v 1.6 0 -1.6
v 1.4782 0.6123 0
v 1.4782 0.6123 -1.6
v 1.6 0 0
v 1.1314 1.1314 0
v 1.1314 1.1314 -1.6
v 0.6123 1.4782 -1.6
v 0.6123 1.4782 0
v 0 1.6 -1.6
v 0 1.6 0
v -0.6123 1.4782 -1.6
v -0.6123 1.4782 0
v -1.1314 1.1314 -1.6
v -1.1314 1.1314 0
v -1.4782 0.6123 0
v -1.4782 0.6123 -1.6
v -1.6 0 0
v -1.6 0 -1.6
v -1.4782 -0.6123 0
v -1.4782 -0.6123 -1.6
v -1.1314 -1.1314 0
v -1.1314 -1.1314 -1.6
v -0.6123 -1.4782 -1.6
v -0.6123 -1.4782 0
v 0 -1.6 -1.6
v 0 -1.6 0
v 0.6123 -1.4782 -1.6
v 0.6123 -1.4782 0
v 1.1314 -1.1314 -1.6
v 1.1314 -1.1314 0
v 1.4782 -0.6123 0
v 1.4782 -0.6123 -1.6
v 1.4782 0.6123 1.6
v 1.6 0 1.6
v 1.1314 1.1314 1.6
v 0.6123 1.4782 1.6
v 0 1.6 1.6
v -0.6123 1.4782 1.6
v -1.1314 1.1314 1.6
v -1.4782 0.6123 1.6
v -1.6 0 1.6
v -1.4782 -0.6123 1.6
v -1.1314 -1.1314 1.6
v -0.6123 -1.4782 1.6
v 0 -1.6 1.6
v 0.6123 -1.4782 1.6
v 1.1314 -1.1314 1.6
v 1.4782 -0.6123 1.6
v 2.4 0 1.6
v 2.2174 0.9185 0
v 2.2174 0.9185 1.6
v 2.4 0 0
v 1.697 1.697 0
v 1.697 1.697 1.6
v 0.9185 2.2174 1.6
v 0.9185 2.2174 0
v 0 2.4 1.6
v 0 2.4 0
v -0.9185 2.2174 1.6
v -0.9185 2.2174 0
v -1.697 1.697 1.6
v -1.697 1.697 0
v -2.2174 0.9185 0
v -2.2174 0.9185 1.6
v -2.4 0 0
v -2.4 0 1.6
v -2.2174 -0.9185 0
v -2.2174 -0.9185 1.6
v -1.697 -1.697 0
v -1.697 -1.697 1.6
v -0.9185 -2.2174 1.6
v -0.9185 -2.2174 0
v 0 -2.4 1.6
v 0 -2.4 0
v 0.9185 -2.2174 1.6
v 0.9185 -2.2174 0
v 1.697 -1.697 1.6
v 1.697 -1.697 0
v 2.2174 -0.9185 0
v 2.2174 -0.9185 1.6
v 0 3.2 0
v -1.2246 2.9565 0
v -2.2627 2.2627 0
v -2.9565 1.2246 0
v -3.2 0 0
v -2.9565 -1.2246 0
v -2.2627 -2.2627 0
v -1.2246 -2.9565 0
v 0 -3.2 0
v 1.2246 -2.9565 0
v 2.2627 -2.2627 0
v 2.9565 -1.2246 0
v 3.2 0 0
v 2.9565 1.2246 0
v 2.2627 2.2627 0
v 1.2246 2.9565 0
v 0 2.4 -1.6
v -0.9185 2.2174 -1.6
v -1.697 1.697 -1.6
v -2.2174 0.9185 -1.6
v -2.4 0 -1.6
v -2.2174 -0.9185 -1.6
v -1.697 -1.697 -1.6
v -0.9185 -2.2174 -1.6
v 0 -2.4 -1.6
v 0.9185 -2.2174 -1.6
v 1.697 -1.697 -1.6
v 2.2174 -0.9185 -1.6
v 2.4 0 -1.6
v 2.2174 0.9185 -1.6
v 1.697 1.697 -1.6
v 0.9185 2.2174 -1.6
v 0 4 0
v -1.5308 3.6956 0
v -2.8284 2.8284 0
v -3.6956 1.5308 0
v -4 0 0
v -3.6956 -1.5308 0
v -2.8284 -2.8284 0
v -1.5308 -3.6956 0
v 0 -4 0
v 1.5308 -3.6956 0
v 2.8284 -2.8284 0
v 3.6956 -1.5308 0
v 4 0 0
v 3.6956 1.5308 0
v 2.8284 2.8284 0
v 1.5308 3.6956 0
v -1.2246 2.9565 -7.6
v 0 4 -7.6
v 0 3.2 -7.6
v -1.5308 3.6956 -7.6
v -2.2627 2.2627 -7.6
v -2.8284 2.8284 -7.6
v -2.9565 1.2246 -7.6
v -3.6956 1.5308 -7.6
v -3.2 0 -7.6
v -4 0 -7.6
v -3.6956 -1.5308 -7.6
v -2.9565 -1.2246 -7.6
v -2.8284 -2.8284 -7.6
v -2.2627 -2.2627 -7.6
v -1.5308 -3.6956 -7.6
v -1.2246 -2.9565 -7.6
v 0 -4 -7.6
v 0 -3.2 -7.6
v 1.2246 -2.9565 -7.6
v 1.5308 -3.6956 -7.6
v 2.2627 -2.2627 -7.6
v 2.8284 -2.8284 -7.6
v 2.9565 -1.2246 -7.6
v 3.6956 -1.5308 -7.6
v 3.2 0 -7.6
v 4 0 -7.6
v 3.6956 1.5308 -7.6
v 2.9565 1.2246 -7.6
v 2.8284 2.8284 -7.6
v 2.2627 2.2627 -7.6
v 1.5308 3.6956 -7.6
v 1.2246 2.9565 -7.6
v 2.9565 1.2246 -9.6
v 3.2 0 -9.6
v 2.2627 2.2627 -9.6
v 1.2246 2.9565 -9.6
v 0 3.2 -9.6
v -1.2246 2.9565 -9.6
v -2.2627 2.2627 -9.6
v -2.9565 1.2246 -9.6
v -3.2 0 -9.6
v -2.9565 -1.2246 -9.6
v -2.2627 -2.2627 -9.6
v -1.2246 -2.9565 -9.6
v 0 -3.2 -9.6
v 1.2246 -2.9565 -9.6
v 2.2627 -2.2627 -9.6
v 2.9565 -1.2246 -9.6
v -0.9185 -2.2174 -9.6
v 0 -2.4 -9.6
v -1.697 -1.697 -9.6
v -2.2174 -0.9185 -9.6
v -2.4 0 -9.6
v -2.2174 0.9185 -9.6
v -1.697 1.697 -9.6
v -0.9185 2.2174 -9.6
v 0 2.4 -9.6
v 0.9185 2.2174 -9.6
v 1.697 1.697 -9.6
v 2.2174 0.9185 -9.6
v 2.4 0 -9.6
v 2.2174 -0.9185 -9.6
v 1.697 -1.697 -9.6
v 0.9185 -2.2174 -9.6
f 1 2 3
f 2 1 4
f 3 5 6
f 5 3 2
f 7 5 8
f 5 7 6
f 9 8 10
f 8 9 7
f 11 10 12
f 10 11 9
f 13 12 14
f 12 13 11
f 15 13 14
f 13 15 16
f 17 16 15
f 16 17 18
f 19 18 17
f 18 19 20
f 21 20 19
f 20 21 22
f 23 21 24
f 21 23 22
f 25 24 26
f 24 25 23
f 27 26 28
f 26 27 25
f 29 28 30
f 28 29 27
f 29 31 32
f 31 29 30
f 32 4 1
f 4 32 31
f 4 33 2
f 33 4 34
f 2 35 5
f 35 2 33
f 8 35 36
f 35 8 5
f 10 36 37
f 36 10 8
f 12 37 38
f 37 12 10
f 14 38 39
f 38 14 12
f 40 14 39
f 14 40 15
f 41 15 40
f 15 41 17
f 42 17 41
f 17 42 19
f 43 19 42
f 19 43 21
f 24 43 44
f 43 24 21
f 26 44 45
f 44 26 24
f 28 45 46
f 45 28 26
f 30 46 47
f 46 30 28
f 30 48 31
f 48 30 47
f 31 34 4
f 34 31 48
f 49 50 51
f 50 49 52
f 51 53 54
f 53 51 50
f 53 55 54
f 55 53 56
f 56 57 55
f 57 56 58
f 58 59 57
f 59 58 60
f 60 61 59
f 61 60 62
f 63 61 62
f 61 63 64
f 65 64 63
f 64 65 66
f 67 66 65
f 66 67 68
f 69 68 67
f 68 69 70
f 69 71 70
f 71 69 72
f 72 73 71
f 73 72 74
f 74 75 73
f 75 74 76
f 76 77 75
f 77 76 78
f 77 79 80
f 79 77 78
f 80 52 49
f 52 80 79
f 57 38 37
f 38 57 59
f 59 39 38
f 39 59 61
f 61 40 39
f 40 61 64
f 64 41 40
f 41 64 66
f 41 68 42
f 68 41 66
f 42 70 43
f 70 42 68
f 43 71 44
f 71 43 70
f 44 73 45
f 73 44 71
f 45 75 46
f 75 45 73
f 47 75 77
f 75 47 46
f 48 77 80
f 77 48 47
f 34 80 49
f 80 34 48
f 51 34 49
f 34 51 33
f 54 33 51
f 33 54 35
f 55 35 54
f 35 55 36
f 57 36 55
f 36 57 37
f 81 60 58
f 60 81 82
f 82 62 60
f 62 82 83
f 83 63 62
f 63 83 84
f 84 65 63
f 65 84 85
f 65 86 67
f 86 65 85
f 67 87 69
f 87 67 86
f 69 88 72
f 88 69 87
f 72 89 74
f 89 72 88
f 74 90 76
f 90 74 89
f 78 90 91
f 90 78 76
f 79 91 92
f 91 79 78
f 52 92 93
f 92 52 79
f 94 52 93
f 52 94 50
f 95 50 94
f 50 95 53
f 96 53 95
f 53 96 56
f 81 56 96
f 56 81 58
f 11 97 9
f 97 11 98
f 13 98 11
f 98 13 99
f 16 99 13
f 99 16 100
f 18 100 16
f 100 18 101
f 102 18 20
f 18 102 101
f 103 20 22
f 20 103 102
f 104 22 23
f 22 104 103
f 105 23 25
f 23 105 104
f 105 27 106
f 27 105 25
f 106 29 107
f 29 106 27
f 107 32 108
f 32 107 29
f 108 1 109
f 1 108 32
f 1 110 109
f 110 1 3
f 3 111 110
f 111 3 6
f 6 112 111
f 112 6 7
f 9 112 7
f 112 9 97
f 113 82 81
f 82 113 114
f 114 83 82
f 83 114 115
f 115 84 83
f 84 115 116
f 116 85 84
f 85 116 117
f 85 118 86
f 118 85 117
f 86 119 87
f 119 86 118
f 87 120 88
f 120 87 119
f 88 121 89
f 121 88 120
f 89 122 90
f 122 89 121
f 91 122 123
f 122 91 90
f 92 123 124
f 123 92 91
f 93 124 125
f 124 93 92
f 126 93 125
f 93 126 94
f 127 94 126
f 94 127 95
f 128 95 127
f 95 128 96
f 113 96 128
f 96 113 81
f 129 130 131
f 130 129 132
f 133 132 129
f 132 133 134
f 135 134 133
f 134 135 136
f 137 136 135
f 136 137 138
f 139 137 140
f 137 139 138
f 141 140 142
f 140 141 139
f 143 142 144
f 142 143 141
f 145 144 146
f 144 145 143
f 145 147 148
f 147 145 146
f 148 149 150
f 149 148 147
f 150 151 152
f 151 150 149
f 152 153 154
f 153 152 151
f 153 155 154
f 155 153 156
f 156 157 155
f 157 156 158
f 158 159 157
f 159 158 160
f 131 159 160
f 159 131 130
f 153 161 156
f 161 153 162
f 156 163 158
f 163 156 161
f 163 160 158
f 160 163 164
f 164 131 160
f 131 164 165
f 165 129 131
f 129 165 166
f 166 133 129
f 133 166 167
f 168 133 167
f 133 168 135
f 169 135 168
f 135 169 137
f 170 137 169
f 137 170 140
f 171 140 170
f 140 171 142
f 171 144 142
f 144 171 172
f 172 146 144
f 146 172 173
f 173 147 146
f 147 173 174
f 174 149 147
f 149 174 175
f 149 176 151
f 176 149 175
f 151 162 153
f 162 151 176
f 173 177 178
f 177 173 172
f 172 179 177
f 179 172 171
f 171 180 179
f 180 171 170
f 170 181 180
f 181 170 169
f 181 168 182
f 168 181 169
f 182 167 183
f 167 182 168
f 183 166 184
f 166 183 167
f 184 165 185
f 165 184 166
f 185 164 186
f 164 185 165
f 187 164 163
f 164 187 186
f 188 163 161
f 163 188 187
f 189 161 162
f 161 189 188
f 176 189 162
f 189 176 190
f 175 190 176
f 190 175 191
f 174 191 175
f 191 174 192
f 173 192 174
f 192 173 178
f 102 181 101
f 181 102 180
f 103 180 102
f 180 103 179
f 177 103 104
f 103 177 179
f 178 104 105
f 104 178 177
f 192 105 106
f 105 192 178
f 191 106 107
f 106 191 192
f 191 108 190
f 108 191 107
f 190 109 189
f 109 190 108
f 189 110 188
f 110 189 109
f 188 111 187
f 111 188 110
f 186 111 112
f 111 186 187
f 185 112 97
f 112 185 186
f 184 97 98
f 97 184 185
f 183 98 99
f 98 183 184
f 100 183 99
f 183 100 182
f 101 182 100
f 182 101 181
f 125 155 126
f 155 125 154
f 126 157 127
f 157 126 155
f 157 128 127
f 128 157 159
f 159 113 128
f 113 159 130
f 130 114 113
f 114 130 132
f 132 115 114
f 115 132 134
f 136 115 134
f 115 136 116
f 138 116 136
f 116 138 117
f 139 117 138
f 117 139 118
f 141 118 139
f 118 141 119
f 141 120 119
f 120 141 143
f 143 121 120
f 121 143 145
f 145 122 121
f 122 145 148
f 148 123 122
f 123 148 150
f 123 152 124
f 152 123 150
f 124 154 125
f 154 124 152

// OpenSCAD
// file: ../p/stud4od.scad
use <../lib.scad>
use <4-4cylo.scad>
use <4-4ring3.scad>
function ldraw_lib__stud4od() = [
// 0 Stud Tube Open without Outer Cylinder and Top Surface
// 0 Name: stud4od.dat
// 0 Author: Philippe Hurbain [Philo]
// 0 !LDRAW_ORG Primitive UPDATE 2013-02
// 0 !LICENSE Licensed under CC BY 2.0 and CC BY 4.0 : see CAreadme.txt
// 
// 0 !HELP This stud is a "antistud" to be used like a underside stud,
// 0 !HELP but without the outer cylinder.
// 0 !HELP 1 47 0 0 0 1 0 0 0 1 0 0 0 1 stud4.dat
// 
// 0 BFC CERTIFY CCW
  [0,"BFC","CERTIFY"],
  [0,"BFC","CCW"],
// 
// 0 !HISTORY 2013-12-23 [PTadmin] Official Update 2013-02
// 
// 
// 1 16 0 -4 0 2 0 0 0 1 0 0 0 2 4-4ring3.dat
  [1,16,0,-4,0,2,0,0,0,1,0,0,0,2, ldraw_lib__4_4ring3()],
// 0 BFC INVERTNEXT
  [0,"BFC","INVERTNEXT"],
// 1 16 0 0 0 -6 0 0 0 -4 0 0 0 6 4-4cylo.dat
  [1,16,0,0,0,-6,0,0,0,-4,0,0,0,6, ldraw_lib__4_4cylo()],
];
makepoly(ldraw_lib__stud4od(), line=0.2);
// file: ../p/stud2a.scad
use <../lib.scad>
use <4-4cyli.scad>
use <4-4edge.scad>
use <4-4ring2.scad>
function ldraw_lib__stud2a() = [
// 0 Stud Open without Base Edges
// 0 Name: stud2a.dat
// 0 Author: James Jessiman
// 0 !LDRAW_ORG Primitive UPDATE 2009-02
// 0 !LICENSE Licensed under CC BY 2.0 and CC BY 4.0 : see CAreadme.txt
// 
// 0 BFC CERTIFY CCW
  [0,"BFC","CERTIFY"],
  [0,"BFC","CCW"],
// 
// 0 !HISTORY 1999-07-05 [PTadmin] Official Update 1999-05
// 0 !HISTORY 2002-04-04 [sbliss] Modified for BFC compliance
// 0 !HISTORY 2002-04-25 [PTadmin] Official Update 2002-02
// 0 !HISTORY 2007-06-24 [PTadmin] Header formatted for Contributor Agreement
// 0 !HISTORY 2008-07-01 [PTadmin] Official Update 2008-01
// 0 !HISTORY 2009-06-21 [cwdee] Update ring references to 4-4ring
// 0 !HISTORY 2009-09-03 [PTadmin] Official Update 2009-02
// 
// 
// 1 16 0 -4 0 4 0 0 0 1 0 0 0 4 4-4edge.dat
  [1,16,0,-4,0,4,0,0,0,1,0,0,0,4, ldraw_lib__4_4edge()],
// 1 16 0 -4 0 6 0 0 0 1 0 0 0 6 4-4edge.dat
  [1,16,0,-4,0,6,0,0,0,1,0,0,0,6, ldraw_lib__4_4edge()],
// 0 BFC INVERTNEXT
  [0,"BFC","INVERTNEXT"],
// 1 16 0 -4 0 4 0 0 0 4 0 0 0 4 4-4cyli.dat
  [1,16,0,-4,0,4,0,0,0,4,0,0,0,4, ldraw_lib__4_4cyli()],
// 1 16 0 -4 0 6 0 0 0 4 0 0 0 6 4-4cyli.dat
  [1,16,0,-4,0,6,0,0,0,4,0,0,0,6, ldraw_lib__4_4cyli()],
// 1 16 0 -4 0 2 0 0 0 1 0 0 0 2 4-4ring2.dat
  [1,16,0,-4,0,2,0,0,0,1,0,0,0,2, ldraw_lib__4_4ring2()],
// 0
];
makepoly(ldraw_lib__stud2a(), line=0.2);
// file: ../p/4-4ring4.scad
use <../lib.scad>
function ldraw_lib__4_4ring4() = [
// 0 Ring  4 x 1.0
// 0 Name: 4-4ring4.dat
// 0 Author: James Jessiman
// 0 !LDRAW_ORG Primitive UPDATE 2009-01
// 0 !LICENSE Licensed under CC BY 2.0 and CC BY 4.0 : see CAreadme.txt
// 
// 0 BFC CERTIFY CCW
  [0,"BFC","CERTIFY"],
  [0,"BFC","CCW"],
// 
// 0 !HISTORY 1998-12-15 [PTadmin] Official Update 1998-10
// 0 !HISTORY 2002-04-08 [BrickCaster] Modified for BFC compliance
// 0 !HISTORY 2002-04-25 [PTadmin] Official Update 2002-02
// 0 !HISTORY 2007-06-24 [PTadmin] Header formatted for Contributor Agreement
// 0 !HISTORY 2008-07-01 [PTadmin] Official Update 2008-01
// 0 !HISTORY 2008-08-26 [cwdee] Switch polygon winding and rename
// 0 !HISTORY 2009-05-02 [PTadmin] Official Update 2009-01
// 
// 
// 4 16 -1.9135 0 4.6195 -1.5308 0 3.6956 0 0 4 0 0 5
  [4,16,-1.9135,0,4.6195,-1.5308,0,3.6956,0,0,4,0,0,5],
// 4 16 -3.5355 0 3.5355 -2.8284 0 2.8284 -1.5308 0 3.6956 -1.9135 0 4.6195
  [4,16,-3.5355,0,3.5355,-2.8284,0,2.8284,-1.5308,0,3.6956,-1.9135,0,4.6195],
// 4 16 -4.6195 0 1.9135 -3.6956 0 1.5308 -2.8284 0 2.8284 -3.5355 0 3.5355
  [4,16,-4.6195,0,1.9135,-3.6956,0,1.5308,-2.8284,0,2.8284,-3.5355,0,3.5355],
// 4 16 -5 0 0 -4 0 0 -3.6956 0 1.5308 -4.6195 0 1.9135
  [4,16,-5,0,0,-4,0,0,-3.6956,0,1.5308,-4.6195,0,1.9135],
// 4 16 -4.6195 0 -1.9135 -3.6956 0 -1.5308 -4 0 0 -5 0 0
  [4,16,-4.6195,0,-1.9135,-3.6956,0,-1.5308,-4,0,0,-5,0,0],
// 4 16 -3.5355 0 -3.5355 -2.8284 0 -2.8284 -3.6956 0 -1.5308 -4.6195 0 -1.9135
  [4,16,-3.5355,0,-3.5355,-2.8284,0,-2.8284,-3.6956,0,-1.5308,-4.6195,0,-1.9135],
// 4 16 -1.9135 0 -4.6195 -1.5308 0 -3.6956 -2.8284 0 -2.8284 -3.5355 0 -3.5355
  [4,16,-1.9135,0,-4.6195,-1.5308,0,-3.6956,-2.8284,0,-2.8284,-3.5355,0,-3.5355],
// 4 16 0 0 -5 0 0 -4 -1.5308 0 -3.6956 -1.9135 0 -4.6195
  [4,16,0,0,-5,0,0,-4,-1.5308,0,-3.6956,-1.9135,0,-4.6195],
// 4 16 1.9135 0 -4.6195 1.5308 0 -3.6956 0 0 -4 0 0 -5
  [4,16,1.9135,0,-4.6195,1.5308,0,-3.6956,0,0,-4,0,0,-5],
// 4 16 3.5355 0 -3.5355 2.8284 0 -2.8284 1.5308 0 -3.6956 1.9135 0 -4.6195
  [4,16,3.5355,0,-3.5355,2.8284,0,-2.8284,1.5308,0,-3.6956,1.9135,0,-4.6195],
// 4 16 4.6195 0 -1.9135 3.6956 0 -1.5308 2.8284 0 -2.8284 3.5355 0 -3.5355
  [4,16,4.6195,0,-1.9135,3.6956,0,-1.5308,2.8284,0,-2.8284,3.5355,0,-3.5355],
// 4 16 5 0 0 4 0 0 3.6956 0 -1.5308 4.6195 0 -1.9135
  [4,16,5,0,0,4,0,0,3.6956,0,-1.5308,4.6195,0,-1.9135],
// 4 16 4.6195 0 1.9135 3.6956 0 1.5308 4 0 0 5 0 0
  [4,16,4.6195,0,1.9135,3.6956,0,1.5308,4,0,0,5,0,0],
// 4 16 3.5355 0 3.5355 2.8284 0 2.8284 3.6956 0 1.5308 4.6195 0 1.9135
  [4,16,3.5355,0,3.5355,2.8284,0,2.8284,3.6956,0,1.5308,4.6195,0,1.9135],
// 4 16 1.9135 0 4.6195 1.5308 0 3.6956 2.8284 0 2.8284 3.5355 0 3.5355
  [4,16,1.9135,0,4.6195,1.5308,0,3.6956,2.8284,0,2.8284,3.5355,0,3.5355],
// 4 16 0 0 5 0 0 4 1.5308 0 3.6956 1.9135 0 4.6195
  [4,16,0,0,5,0,0,4,1.5308,0,3.6956,1.9135,0,4.6195],
// 0
];
makepoly(ldraw_lib__4_4ring4(), line=0.2);
// file: ../p/4-4ring3.scad
use <../lib.scad>
function ldraw_lib__4_4ring3() = [
// 0 Ring  3 x 1.0
// 0 Name: 4-4ring3.dat
// 0 Author: James Jessiman
// 0 !LDRAW_ORG Primitive UPDATE 2009-01
// 0 !LICENSE Licensed under CC BY 2.0 and CC BY 4.0 : see CAreadme.txt
// 
// 0 BFC CERTIFY CCW
  [0,"BFC","CERTIFY"],
  [0,"BFC","CCW"],
// 
// 0 !HISTORY 1998-12-15 [PTadmin] Official Update 1998-10
// 0 !HISTORY 2002-04-05 [hafhead] Added BFC statement
// 0 !HISTORY 2002-04-25 [PTadmin] Official Update 2002-02
// 0 !HISTORY 2007-06-24 [PTadmin] Header formatted for Contributor Agreement
// 0 !HISTORY 2008-07-01 [PTadmin] Official Update 2008-01
// 0 !HISTORY 2008-08-26 [cwdee] Switch polygon winding and rename
// 0 !HISTORY 2009-05-02 [PTadmin] Official Update 2009-01
// 
// 
// 4 16 -1.5308 0 3.6956 -1.1481 0 2.7717 0 0 3 0 0 4
  [4,16,-1.5308,0,3.6956,-1.1481,0,2.7717,0,0,3,0,0,4],
// 4 16 -2.8284 0 2.8284 -2.1213 0 2.1213 -1.1481 0 2.7717 -1.5308 0 3.6956
  [4,16,-2.8284,0,2.8284,-2.1213,0,2.1213,-1.1481,0,2.7717,-1.5308,0,3.6956],
// 4 16 -3.6956 0 1.5308 -2.7717 0 1.1481 -2.1213 0 2.1213 -2.8284 0 2.8284
  [4,16,-3.6956,0,1.5308,-2.7717,0,1.1481,-2.1213,0,2.1213,-2.8284,0,2.8284],
// 4 16 -4 0 0 -3 0 0 -2.7717 0 1.1481 -3.6956 0 1.5308
  [4,16,-4,0,0,-3,0,0,-2.7717,0,1.1481,-3.6956,0,1.5308],
// 4 16 -3.6956 0 -1.5308 -2.7717 0 -1.1481 -3 0 0 -4 0 0
  [4,16,-3.6956,0,-1.5308,-2.7717,0,-1.1481,-3,0,0,-4,0,0],
// 4 16 -2.8284 0 -2.8284 -2.1213 0 -2.1213 -2.7717 0 -1.1481 -3.6956 0 -1.5308
  [4,16,-2.8284,0,-2.8284,-2.1213,0,-2.1213,-2.7717,0,-1.1481,-3.6956,0,-1.5308],
// 4 16 -1.5308 0 -3.6956 -1.1481 0 -2.7717 -2.1213 0 -2.1213 -2.8284 0 -2.8284
  [4,16,-1.5308,0,-3.6956,-1.1481,0,-2.7717,-2.1213,0,-2.1213,-2.8284,0,-2.8284],
// 4 16 0 0 -4 0 0 -3 -1.1481 0 -2.7717 -1.5308 0 -3.6956
  [4,16,0,0,-4,0,0,-3,-1.1481,0,-2.7717,-1.5308,0,-3.6956],
// 4 16 1.5308 0 -3.6956 1.1481 0 -2.7717 0 0 -3 0 0 -4
  [4,16,1.5308,0,-3.6956,1.1481,0,-2.7717,0,0,-3,0,0,-4],
// 4 16 2.8284 0 -2.8284 2.1213 0 -2.1213 1.1481 0 -2.7717 1.5308 0 -3.6956
  [4,16,2.8284,0,-2.8284,2.1213,0,-2.1213,1.1481,0,-2.7717,1.5308,0,-3.6956],
// 4 16 3.6956 0 -1.5308 2.7717 0 -1.1481 2.1213 0 -2.1213 2.8284 0 -2.8284
  [4,16,3.6956,0,-1.5308,2.7717,0,-1.1481,2.1213,0,-2.1213,2.8284,0,-2.8284],
// 4 16 4 0 0 3 0 0 2.7717 0 -1.1481 3.6956 0 -1.5308
  [4,16,4,0,0,3,0,0,2.7717,0,-1.1481,3.6956,0,-1.5308],
// 4 16 3.6956 0 1.5308 2.7717 0 1.1481 3 0 0 4 0 0
  [4,16,3.6956,0,1.5308,2.7717,0,1.1481,3,0,0,4,0,0],
// 4 16 2.8284 0 2.8284 2.1213 0 2.1213 2.7717 0 1.1481 3.6956 0 1.5308
  [4,16,2.8284,0,2.8284,2.1213,0,2.1213,2.7717,0,1.1481,3.6956,0,1.5308],
// 4 16 1.5308 0 3.6956 1.1481 0 2.7717 2.1213 0 2.1213 2.8284 0 2.8284
  [4,16,1.5308,0,3.6956,1.1481,0,2.7717,2.1213,0,2.1213,2.8284,0,2.8284],
// 4 16 0 0 4 0 0 3 1.1481 0 2.7717 1.5308 0 3.6956
  [4,16,0,0,4,0,0,3,1.1481,0,2.7717,1.5308,0,3.6956],
// 0
];
makepoly(ldraw_lib__4_4ring3(), line=0.2);
// file: ../p/4-4ring2.scad
use <../lib.scad>
function ldraw_lib__4_4ring2() = [
// 0 Ring  2 x 1.0
// 0 Name: 4-4ring2.dat
// 0 Author: James Jessiman
// 0 !LDRAW_ORG Primitive UPDATE 2009-01
// 0 !LICENSE Licensed under CC BY 2.0 and CC BY 4.0 : see CAreadme.txt
// 
// 0 BFC CERTIFY CCW
  [0,"BFC","CERTIFY"],
  [0,"BFC","CCW"],
// 
// 0 !HISTORY 1998-12-15 [PTadmin] Official Update 1998-10
// 0 !HISTORY 2002-04-05 [hafhead] Added BFC statement
// 0 !HISTORY 2002-04-25 [PTadmin] Official Update 2002-02
// 0 !HISTORY 2007-06-24 [PTadmin] Header formatted for Contributor Agreement
// 0 !HISTORY 2008-07-01 [PTadmin] Official Update 2008-01
// 0 !HISTORY 2008-08-26 [cwdee] Switch polygon winding and rename
// 0 !HISTORY 2009-05-02 [PTadmin] Official Update 2009-01
// 
// 
// 4 16 -1.1481 0 2.7717 -0.7654 0 1.8478 0 0 2 0 0 3
  [4,16,-1.1481,0,2.7717,-0.7654,0,1.8478,0,0,2,0,0,3],
// 4 16 -2.1213 0 2.1213 -1.4142 0 1.4142 -0.7654 0 1.8478 -1.1481 0 2.7717
  [4,16,-2.1213,0,2.1213,-1.4142,0,1.4142,-0.7654,0,1.8478,-1.1481,0,2.7717],
// 4 16 -2.7717 0 1.1481 -1.8478 0 0.7654 -1.4142 0 1.4142 -2.1213 0 2.1213
  [4,16,-2.7717,0,1.1481,-1.8478,0,0.7654,-1.4142,0,1.4142,-2.1213,0,2.1213],
// 4 16 -3 0 0 -2 0 0 -1.8478 0 0.7654 -2.7717 0 1.1481
  [4,16,-3,0,0,-2,0,0,-1.8478,0,0.7654,-2.7717,0,1.1481],
// 4 16 -2.7717 0 -1.1481 -1.8478 0 -0.7654 -2 0 0 -3 0 0
  [4,16,-2.7717,0,-1.1481,-1.8478,0,-0.7654,-2,0,0,-3,0,0],
// 4 16 -2.1213 0 -2.1213 -1.4142 0 -1.4142 -1.8478 0 -0.7654 -2.7717 0 -1.1481
  [4,16,-2.1213,0,-2.1213,-1.4142,0,-1.4142,-1.8478,0,-0.7654,-2.7717,0,-1.1481],
// 4 16 -1.1481 0 -2.7717 -0.7654 0 -1.8478 -1.4142 0 -1.4142 -2.1213 0 -2.1213
  [4,16,-1.1481,0,-2.7717,-0.7654,0,-1.8478,-1.4142,0,-1.4142,-2.1213,0,-2.1213],
// 4 16 0 0 -3 0 0 -2 -0.7654 0 -1.8478 -1.1481 0 -2.7717
  [4,16,0,0,-3,0,0,-2,-0.7654,0,-1.8478,-1.1481,0,-2.7717],
// 4 16 1.1481 0 -2.7717 0.7654 0 -1.8478 0 0 -2 0 0 -3
  [4,16,1.1481,0,-2.7717,0.7654,0,-1.8478,0,0,-2,0,0,-3],
// 4 16 2.1213 0 -2.1213 1.4142 0 -1.4142 0.7654 0 -1.8478 1.1481 0 -2.7717
  [4,16,2.1213,0,-2.1213,1.4142,0,-1.4142,0.7654,0,-1.8478,1.1481,0,-2.7717],
// 4 16 2.7717 0 -1.1481 1.8478 0 -0.7654 1.4142 0 -1.4142 2.1213 0 -2.1213
  [4,16,2.7717,0,-1.1481,1.8478,0,-0.7654,1.4142,0,-1.4142,2.1213,0,-2.1213],
// 4 16 3 0 0 2 0 0 1.8478 0 -0.7654 2.7717 0 -1.1481
  [4,16,3,0,0,2,0,0,1.8478,0,-0.7654,2.7717,0,-1.1481],
// 4 16 2.7717 0 1.1481 1.8478 0 0.7654 2 0 0 3 0 0
  [4,16,2.7717,0,1.1481,1.8478,0,0.7654,2,0,0,3,0,0],
// 4 16 2.1213 0 2.1213 1.4142 0 1.4142 1.8478 0 0.7654 2.7717 0 1.1481
  [4,16,2.1213,0,2.1213,1.4142,0,1.4142,1.8478,0,0.7654,2.7717,0,1.1481],
// 4 16 1.1481 0 2.7717 0.7654 0 1.8478 1.4142 0 1.4142 2.1213 0 2.1213
  [4,16,1.1481,0,2.7717,0.7654,0,1.8478,1.4142,0,1.4142,2.1213,0,2.1213],
// 4 16 0 0 3 0 0 2 0.7654 0 1.8478 1.1481 0 2.7717
  [4,16,0,0,3,0,0,2,0.7654,0,1.8478,1.1481,0,2.7717],
// 0
];
makepoly(ldraw_lib__4_4ring2(), line=0.2);
// file: ../p/4-4edge.scad
use <../lib.scad>
function ldraw_lib__4_4edge() = [
// 0 Circle 1.0
// 0 Name: 4-4edge.dat
// 0 Author: James Jessiman
// 0 !LDRAW_ORG Primitive UPDATE 2017-01
// 0 !LICENSE Licensed under CC BY 2.0 and CC BY 4.0 : see CAreadme.txt
// 
// 0 BFC CERTIFY CCW
  [0,"BFC","CERTIFY"],
  [0,"BFC","CCW"],
// 
// 0 !HISTORY 1998-12-15 [PTadmin] Official Update 1998-10
// 0 !HISTORY 2005-12-28 [PTadmin] Official Update 2005-01
// 0 !HISTORY 2007-06-24 [PTadmin] Header formatted for Contributor Agreement
// 0 !HISTORY 2008-07-01 [PTadmin] Official Update 2008-01
// 0 !HISTORY 2017-01-15 [Steffen] BFCed
// 0 !HISTORY 2017-12-30 [PTadmin] Official Update 2017-01
// 
// 
// 2 24 1 0 0 0.9239 0 0.3827
  [2,24,1,0,0,0.9239,0,0.3827],
// 2 24 0.9239 0 0.3827 0.7071 0 0.7071
  [2,24,0.9239,0,0.3827,0.7071,0,0.7071],
// 2 24 0.7071 0 0.7071 0.3827 0 0.9239
  [2,24,0.7071,0,0.7071,0.3827,0,0.9239],
// 2 24 0.3827 0 0.9239 0 0 1
  [2,24,0.3827,0,0.9239,0,0,1],
// 2 24 0 0 1 -0.3827 0 0.9239
  [2,24,0,0,1,-0.3827,0,0.9239],
// 2 24 -0.3827 0 0.9239 -0.7071 0 0.7071
  [2,24,-0.3827,0,0.9239,-0.7071,0,0.7071],
// 2 24 -0.7071 0 0.7071 -0.9239 0 0.3827
  [2,24,-0.7071,0,0.7071,-0.9239,0,0.3827],
// 2 24 -0.9239 0 0.3827 -1 0 -0
  [2,24,-0.9239,0,0.3827,-1,0,-0],
// 2 24 -1 0 -0 -0.9239 0 -0.3827
  [2,24,-1,0,-0,-0.9239,0,-0.3827],
// 2 24 -0.9239 0 -0.3827 -0.7071 0 -0.7071
  [2,24,-0.9239,0,-0.3827,-0.7071,0,-0.7071],
// 2 24 -0.7071 0 -0.7071 -0.3827 0 -0.9239
  [2,24,-0.7071,0,-0.7071,-0.3827,0,-0.9239],
// 2 24 -0.3827 0 -0.9239 0 0 -1
  [2,24,-0.3827,0,-0.9239,0,0,-1],
// 2 24 0 0 -1 0.3827 0 -0.9239
  [2,24,0,0,-1,0.3827,0,-0.9239],
// 2 24 0.3827 0 -0.9239 0.7071 0 -0.7071
  [2,24,0.3827,0,-0.9239,0.7071,0,-0.7071],
// 2 24 0.7071 0 -0.7071 0.9239 0 -0.3827
  [2,24,0.7071,0,-0.7071,0.9239,0,-0.3827],
// 2 24 0.9239 0 -0.3827 1 0 0
  [2,24,0.9239,0,-0.3827,1,0,0],
];
makepoly(ldraw_lib__4_4edge(), line=0.2);
// file: ../p/4-4cylo.scad
use <../lib.scad>
use <4-4cyli.scad>
use <4-4edge.scad>
function ldraw_lib__4_4cylo() = [
// 0 Cylinder Open 1.0
// 0 Name: 4-4cylo.dat
// 0 Author: Mark Kennedy [mkennedy]
// 0 !LDRAW_ORG Primitive UPDATE 2010-01
// 0 !LICENSE Licensed under CC BY 2.0 and CC BY 4.0 : see CAreadme.txt
// 
// 0 BFC CERTIFY CCW
  [0,"BFC","CERTIFY"],
  [0,"BFC","CCW"],
// 
// 0 !HISTORY 2010-04-05 [PTadmin] Official Update 2010-01
// 
// 
// 1 16 0 0 0 1 0 0 0 1 0 0 0 1 4-4edge.dat
  [1,16,0,0,0,1,0,0,0,1,0,0,0,1, ldraw_lib__4_4edge()],
// 1 16 0 1 0 1 0 0 0 1 0 0 0 1 4-4edge.dat
  [1,16,0,1,0,1,0,0,0,1,0,0,0,1, ldraw_lib__4_4edge()],
// 1 16 0 0 0 1 0 0 0 1 0 0 0 1 4-4cyli.dat
  [1,16,0,0,0,1,0,0,0,1,0,0,0,1, ldraw_lib__4_4cyli()],
// 0
];
makepoly(ldraw_lib__4_4cylo(), line=0.2);
// file: s/3062bs01.scad
use <../../lib.scad>
use <../../p/4-4cyli.scad>
use <../../p/4-4cylo.scad>
use <../../p/4-4edge.scad>
use <../../p/4-4ring2.scad>
use <../../p/4-4ring3.scad>
use <../../p/4-4ring4.scad>
use <../../p/stud2a.scad>
use <../../p/stud4od.scad>
function ldraw_lib__s__3062bs01() = [
// 0 ~Brick  1 x  1 Round with Hollow Stud without Outer Surface
// 0 Name: s\3062bs01.dat
// 0 Author: Takeshi Takahashi [RainbowDolphin]
// 0 !LDRAW_ORG Subpart UPDATE 2022-02
// 0 !LICENSE Licensed under CC BY 2.0 and CC BY 4.0 : see CAreadme.txt
// 
// 0 BFC CERTIFY CCW
  [0,"BFC","CERTIFY"],
  [0,"BFC","CCW"],
// 
// 0 !HISTORY 2022-03-06 [PTadmin] Official Update 2022-02
// 
// 
// 1 16 0 4 0 4 0 0 0 1 0 0 0 4 4-4edge.dat
  [1,16,0,4,0,4,0,0,0,1,0,0,0,4, ldraw_lib__4_4edge()],
// 1 16 0 19 0 10 0 0 0 1 0 0 0 10 4-4edge.dat
  [1,16,0,19,0,10,0,0,0,1,0,0,0,10, ldraw_lib__4_4edge()],
// 1 16 0 0 0 10 0 0 0 1 0 0 0 10 4-4edge.dat
  [1,16,0,0,0,10,0,0,0,1,0,0,0,10, ldraw_lib__4_4edge()],
// 1 16 0 0 0 6 0 0 0 1 0 0 0 6 4-4edge.dat
  [1,16,0,0,0,6,0,0,0,1,0,0,0,6, ldraw_lib__4_4edge()],
// 0 BFC INVERTNEXT
  [0,"BFC","INVERTNEXT"],
// 1 16 0 0 0 4 0 0 0 4 0 0 0 4 4-4cyli.dat
  [1,16,0,0,0,4,0,0,0,4,0,0,0,4, ldraw_lib__4_4cyli()],
// 1 16 0 0 0 1 0 0 0 1 0 0 0 1 stud2a.dat
  [1,16,0,0,0,1,0,0,0,1,0,0,0,1, ldraw_lib__stud2a()],
// 1 16 0 0 0 2 0 0 0 1 0 0 0 2 4-4ring3.dat
  [1,16,0,0,0,2,0,0,0,1,0,0,0,2, ldraw_lib__4_4ring3()],
// 1 16 0 4 0 2 0 0 0 -1 0 0 0 2 4-4ring2.dat
  [1,16,0,4,0,2,0,0,0,-1,0,0,0,2, ldraw_lib__4_4ring2()],
// 1 16 0 0 0 2 0 0 0 1 0 0 0 2 4-4ring4.dat
  [1,16,0,0,0,2,0,0,0,1,0,0,0,2, ldraw_lib__4_4ring4()],
// 1 16 0 19 0 2 0 0 0 -1 0 0 0 2 4-4ring4.dat
  [1,16,0,19,0,2,0,0,0,-1,0,0,0,2, ldraw_lib__4_4ring4()],
// 1 16 0 19 0 8 0 0 0 5 0 0 0 8 4-4cylo.dat
  [1,16,0,19,0,8,0,0,0,5,0,0,0,8, ldraw_lib__4_4cylo()],
// 1 16 0 4 0 1 0 0 0 -5 0 0 0 -1 stud4od.dat
  [1,16,0,4,0,1,0,0,0,-5,0,0,0,-1, ldraw_lib__stud4od()],
];
makepoly(ldraw_lib__s__3062bs01(), line=0.2);
// file: ../p/4-4cyli.scad
use <../lib.scad>
function ldraw_lib__4_4cyli() = [
// 0 Cylinder 1.0
// 0 Name: 4-4cyli.dat
// 0 Author: James Jessiman
// 0 !LDRAW_ORG Primitive UPDATE 2005-01
// 0 !LICENSE Licensed under CC BY 2.0 and CC BY 4.0 : see CAreadme.txt
// 
// 0 BFC CERTIFY CCW
  [0,"BFC","CERTIFY"],
  [0,"BFC","CCW"],
// 
// 0 !HISTORY 1998-12-15 [PTadmin] Official Update 1998-10
// 0 !HISTORY 2002-03-23 [sbliss] Added BFC statement; merged headers from files in distributions LDraw 0.27 and Complete.
// 0 !HISTORY 2002-04-25 [PTadmin] Official Update 2002-02
// 0 !HISTORY 2004-12-14 [guyvivan] BFC CCW
// 0 !HISTORY 2005-12-28 [PTadmin] Official Update 2005-01
// 0 !HISTORY 2007-06-24 [PTadmin] Header formatted for Contributor Agreement
// 0 !HISTORY 2008-07-01 [PTadmin] Official Update 2008-01
// 
// 
// 4 16 1 1 0 0.9239 1 0.3827 0.9239 0 0.3827 1 0 0
  [4,16,1,1,0,0.9239,1,0.3827,0.9239,0,0.3827,1,0,0],
// 5 24 1 0 0 1 1 0 0.9239 0 0.3827 0.9239 0 -0.3827
  [5,24,1,0,0,1,1,0,0.9239,0,0.3827,0.9239,0,-0.3827],
// 4 16 0.9239 1 0.3827 0.7071 1 0.7071 0.7071 0 0.7071 0.9239 0 0.3827
  [4,16,0.9239,1,0.3827,0.7071,1,0.7071,0.7071,0,0.7071,0.9239,0,0.3827],
// 5 24 0.9239 0 0.3827 0.9239 1 0.3827 0.7071 0 0.7071 1 0 0
  [5,24,0.9239,0,0.3827,0.9239,1,0.3827,0.7071,0,0.7071,1,0,0],
// 4 16 0.7071 1 0.7071 0.3827 1 0.9239 0.3827 0 0.9239 0.7071 0 0.7071
  [4,16,0.7071,1,0.7071,0.3827,1,0.9239,0.3827,0,0.9239,0.7071,0,0.7071],
// 5 24 0.7071 0 0.7071 0.7071 1 0.7071 0.3827 0 0.9239 0.9239 0 0.3827
  [5,24,0.7071,0,0.7071,0.7071,1,0.7071,0.3827,0,0.9239,0.9239,0,0.3827],
// 4 16 0.3827 1 0.9239 0 1 1 0 0 1 0.3827 0 0.9239
  [4,16,0.3827,1,0.9239,0,1,1,0,0,1,0.3827,0,0.9239],
// 5 24 0.3827 0 0.9239 0.3827 1 0.9239 0 0 1 0.7071 0 0.7071
  [5,24,0.3827,0,0.9239,0.3827,1,0.9239,0,0,1,0.7071,0,0.7071],
// 4 16 0 1 1 -0.3827 1 0.9239 -0.3827 0 0.9239 0 0 1
  [4,16,0,1,1,-0.3827,1,0.9239,-0.3827,0,0.9239,0,0,1],
// 5 24 0 0 1 0 1 1 -0.3827 0 0.9239 0.3827 0 0.9239
  [5,24,0,0,1,0,1,1,-0.3827,0,0.9239,0.3827,0,0.9239],
// 4 16 -0.3827 1 0.9239 -0.7071 1 0.7071 -0.7071 0 0.7071 -0.3827 0 0.9239
  [4,16,-0.3827,1,0.9239,-0.7071,1,0.7071,-0.7071,0,0.7071,-0.3827,0,0.9239],
// 5 24 -0.3827 0 0.9239 -0.3827 1 0.9239 -0.7071 0 0.7071 0 0 1
  [5,24,-0.3827,0,0.9239,-0.3827,1,0.9239,-0.7071,0,0.7071,0,0,1],
// 4 16 -0.7071 1 0.7071 -0.9239 1 0.3827 -0.9239 0 0.3827 -0.7071 0 0.7071
  [4,16,-0.7071,1,0.7071,-0.9239,1,0.3827,-0.9239,0,0.3827,-0.7071,0,0.7071],
// 5 24 -0.7071 0 0.7071 -0.7071 1 0.7071 -0.9239 0 0.3827 -0.3827 0 0.9239
  [5,24,-0.7071,0,0.7071,-0.7071,1,0.7071,-0.9239,0,0.3827,-0.3827,0,0.9239],
// 4 16 -0.9239 1 0.3827 -1 1 0 -1 0 0 -0.9239 0 0.3827
  [4,16,-0.9239,1,0.3827,-1,1,0,-1,0,0,-0.9239,0,0.3827],
// 5 24 -0.9239 0 0.3827 -0.9239 1 0.3827 -1 0 0 -0.7071 0 0.7071
  [5,24,-0.9239,0,0.3827,-0.9239,1,0.3827,-1,0,0,-0.7071,0,0.7071],
// 4 16 -1 1 0 -0.9239 1 -0.3827 -0.9239 0 -0.3827 -1 0 0
  [4,16,-1,1,0,-0.9239,1,-0.3827,-0.9239,0,-0.3827,-1,0,0],
// 5 24 -1 0 0 -1 1 0 -0.9239 0 -0.3827 -0.9239 0 0.3827
  [5,24,-1,0,0,-1,1,0,-0.9239,0,-0.3827,-0.9239,0,0.3827],
// 4 16 -0.9239 1 -0.3827 -0.7071 1 -0.7071 -0.7071 0 -0.7071 -0.9239 0 -0.3827
  [4,16,-0.9239,1,-0.3827,-0.7071,1,-0.7071,-0.7071,0,-0.7071,-0.9239,0,-0.3827],
// 5 24 -0.9239 0 -0.3827 -0.9239 1 -0.3827 -0.7071 0 -0.7071 -1 0 0
  [5,24,-0.9239,0,-0.3827,-0.9239,1,-0.3827,-0.7071,0,-0.7071,-1,0,0],
// 4 16 -0.7071 1 -0.7071 -0.3827 1 -0.9239 -0.3827 0 -0.9239 -0.7071 0 -0.7071
  [4,16,-0.7071,1,-0.7071,-0.3827,1,-0.9239,-0.3827,0,-0.9239,-0.7071,0,-0.7071],
// 5 24 -0.7071 0 -0.7071 -0.7071 1 -0.7071 -0.3827 0 -0.9239 -0.9239 0 -0.3827
  [5,24,-0.7071,0,-0.7071,-0.7071,1,-0.7071,-0.3827,0,-0.9239,-0.9239,0,-0.3827],
// 4 16 -0.3827 1 -0.9239 0 1 -1 0 0 -1 -0.3827 0 -0.9239
  [4,16,-0.3827,1,-0.9239,0,1,-1,0,0,-1,-0.3827,0,-0.9239],
// 5 24 -0.3827 0 -0.9239 -0.3827 1 -0.9239 0 0 -1 -0.7071 0 -0.7071
  [5,24,-0.3827,0,-0.9239,-0.3827,1,-0.9239,0,0,-1,-0.7071,0,-0.7071],
// 4 16 0 1 -1 0.3827 1 -0.9239 0.3827 0 -0.9239 0 0 -1
  [4,16,0,1,-1,0.3827,1,-0.9239,0.3827,0,-0.9239,0,0,-1],
// 5 24 0 0 -1 0 1 -1 0.3827 0 -0.9239 -0.3827 0 -0.9239
  [5,24,0,0,-1,0,1,-1,0.3827,0,-0.9239,-0.3827,0,-0.9239],
// 4 16 0.3827 1 -0.9239 0.7071 1 -0.7071 0.7071 0 -0.7071 0.3827 0 -0.9239
  [4,16,0.3827,1,-0.9239,0.7071,1,-0.7071,0.7071,0,-0.7071,0.3827,0,-0.9239],
// 5 24 0.3827 0 -0.9239 0.3827 1 -0.9239 0.7071 0 -0.7071 0 0 -1
  [5,24,0.3827,0,-0.9239,0.3827,1,-0.9239,0.7071,0,-0.7071,0,0,-1],
// 4 16 0.7071 1 -0.7071 0.9239 1 -0.3827 0.9239 0 -0.3827 0.7071 0 -0.7071
  [4,16,0.7071,1,-0.7071,0.9239,1,-0.3827,0.9239,0,-0.3827,0.7071,0,-0.7071],
// 5 24 0.7071 0 -0.7071 0.7071 1 -0.7071 0.9239 0 -0.3827 0.3827 0 -0.9239
  [5,24,0.7071,0,-0.7071,0.7071,1,-0.7071,0.9239,0,-0.3827,0.3827,0,-0.9239],
// 4 16 0.9239 1 -0.3827 1 1 0 1 0 0 0.9239 0 -0.3827
  [4,16,0.9239,1,-0.3827,1,1,0,1,0,0,0.9239,0,-0.3827],
// 5 24 0.9239 0 -0.3827 0.9239 1 -0.3827 1 0 0 0.7071 0 -0.7071
  [5,24,0.9239,0,-0.3827,0.9239,1,-0.3827,1,0,0,0.7071,0,-0.7071],
// 0
];
makepoly(ldraw_lib__4_4cyli(), line=0.2);
// main file
use <../lib.scad>
use <../p/4-4cyli.scad>
use <s/3062bs01.scad>
function ldraw_lib__3062b() = [
// 0 Brick  1 x  1 Round with Hollow Stud
// 0 Name: 3062b.dat
// 0 Author: James Jessiman
// 0 !LDRAW_ORG Part UPDATE 2022-02
// 0 !LICENSE Licensed under CC BY 2.0 and CC BY 4.0 : see CAreadme.txt
// 
// 0 BFC CERTIFY CCW
  [0,"BFC","CERTIFY"],
  [0,"BFC","CCW"],
// 
// 0 !HISTORY 1998-06-20 [PTadmin] Official Update 1998-06
// 0 !HISTORY 2003-08-02 [OrionP] Made some primitive subs
// 0 !HISTORY 2003-08-04 [Steffen] replaced peghole.dat by stud4a.dat
// 0 !HISTORY 2003-12-19 [PTadmin] Official Update 2003-03
// 0 !HISTORY 2007-06-10 [PTadmin] Header formatted for Contributor Agreement
// 0 !HISTORY 2008-07-01 [PTadmin] Official Update 2008-01
// 0 !HISTORY 2009-03-19 [tchang] Add missing <CR>
// 0 !HISTORY 2009-09-03 [PTadmin] Official Update 2009-02
// 0 !HISTORY 2020-12-12 [RainbowDolphin] Subparted for patterns
// 0 !HISTORY 2022-03-06 [PTadmin] Official Update 2022-02
// 
// 
// 1 16 0 0 0 1 0 0 0 1 0 0 0 1 s\3062bs01.dat
  [1,16,0,0,0,1,0,0,0,1,0,0,0,1, ldraw_lib__s__3062bs01()],
// 1 16 0 0 0 10 0 0 0 19 0 0 0 10 4-4cyli.dat
  [1,16,0,0,0,10,0,0,0,19,0,0,0,10, ldraw_lib__4_4cyli()],
];
makepoly(ldraw_lib__3062b(), line=0.2);
